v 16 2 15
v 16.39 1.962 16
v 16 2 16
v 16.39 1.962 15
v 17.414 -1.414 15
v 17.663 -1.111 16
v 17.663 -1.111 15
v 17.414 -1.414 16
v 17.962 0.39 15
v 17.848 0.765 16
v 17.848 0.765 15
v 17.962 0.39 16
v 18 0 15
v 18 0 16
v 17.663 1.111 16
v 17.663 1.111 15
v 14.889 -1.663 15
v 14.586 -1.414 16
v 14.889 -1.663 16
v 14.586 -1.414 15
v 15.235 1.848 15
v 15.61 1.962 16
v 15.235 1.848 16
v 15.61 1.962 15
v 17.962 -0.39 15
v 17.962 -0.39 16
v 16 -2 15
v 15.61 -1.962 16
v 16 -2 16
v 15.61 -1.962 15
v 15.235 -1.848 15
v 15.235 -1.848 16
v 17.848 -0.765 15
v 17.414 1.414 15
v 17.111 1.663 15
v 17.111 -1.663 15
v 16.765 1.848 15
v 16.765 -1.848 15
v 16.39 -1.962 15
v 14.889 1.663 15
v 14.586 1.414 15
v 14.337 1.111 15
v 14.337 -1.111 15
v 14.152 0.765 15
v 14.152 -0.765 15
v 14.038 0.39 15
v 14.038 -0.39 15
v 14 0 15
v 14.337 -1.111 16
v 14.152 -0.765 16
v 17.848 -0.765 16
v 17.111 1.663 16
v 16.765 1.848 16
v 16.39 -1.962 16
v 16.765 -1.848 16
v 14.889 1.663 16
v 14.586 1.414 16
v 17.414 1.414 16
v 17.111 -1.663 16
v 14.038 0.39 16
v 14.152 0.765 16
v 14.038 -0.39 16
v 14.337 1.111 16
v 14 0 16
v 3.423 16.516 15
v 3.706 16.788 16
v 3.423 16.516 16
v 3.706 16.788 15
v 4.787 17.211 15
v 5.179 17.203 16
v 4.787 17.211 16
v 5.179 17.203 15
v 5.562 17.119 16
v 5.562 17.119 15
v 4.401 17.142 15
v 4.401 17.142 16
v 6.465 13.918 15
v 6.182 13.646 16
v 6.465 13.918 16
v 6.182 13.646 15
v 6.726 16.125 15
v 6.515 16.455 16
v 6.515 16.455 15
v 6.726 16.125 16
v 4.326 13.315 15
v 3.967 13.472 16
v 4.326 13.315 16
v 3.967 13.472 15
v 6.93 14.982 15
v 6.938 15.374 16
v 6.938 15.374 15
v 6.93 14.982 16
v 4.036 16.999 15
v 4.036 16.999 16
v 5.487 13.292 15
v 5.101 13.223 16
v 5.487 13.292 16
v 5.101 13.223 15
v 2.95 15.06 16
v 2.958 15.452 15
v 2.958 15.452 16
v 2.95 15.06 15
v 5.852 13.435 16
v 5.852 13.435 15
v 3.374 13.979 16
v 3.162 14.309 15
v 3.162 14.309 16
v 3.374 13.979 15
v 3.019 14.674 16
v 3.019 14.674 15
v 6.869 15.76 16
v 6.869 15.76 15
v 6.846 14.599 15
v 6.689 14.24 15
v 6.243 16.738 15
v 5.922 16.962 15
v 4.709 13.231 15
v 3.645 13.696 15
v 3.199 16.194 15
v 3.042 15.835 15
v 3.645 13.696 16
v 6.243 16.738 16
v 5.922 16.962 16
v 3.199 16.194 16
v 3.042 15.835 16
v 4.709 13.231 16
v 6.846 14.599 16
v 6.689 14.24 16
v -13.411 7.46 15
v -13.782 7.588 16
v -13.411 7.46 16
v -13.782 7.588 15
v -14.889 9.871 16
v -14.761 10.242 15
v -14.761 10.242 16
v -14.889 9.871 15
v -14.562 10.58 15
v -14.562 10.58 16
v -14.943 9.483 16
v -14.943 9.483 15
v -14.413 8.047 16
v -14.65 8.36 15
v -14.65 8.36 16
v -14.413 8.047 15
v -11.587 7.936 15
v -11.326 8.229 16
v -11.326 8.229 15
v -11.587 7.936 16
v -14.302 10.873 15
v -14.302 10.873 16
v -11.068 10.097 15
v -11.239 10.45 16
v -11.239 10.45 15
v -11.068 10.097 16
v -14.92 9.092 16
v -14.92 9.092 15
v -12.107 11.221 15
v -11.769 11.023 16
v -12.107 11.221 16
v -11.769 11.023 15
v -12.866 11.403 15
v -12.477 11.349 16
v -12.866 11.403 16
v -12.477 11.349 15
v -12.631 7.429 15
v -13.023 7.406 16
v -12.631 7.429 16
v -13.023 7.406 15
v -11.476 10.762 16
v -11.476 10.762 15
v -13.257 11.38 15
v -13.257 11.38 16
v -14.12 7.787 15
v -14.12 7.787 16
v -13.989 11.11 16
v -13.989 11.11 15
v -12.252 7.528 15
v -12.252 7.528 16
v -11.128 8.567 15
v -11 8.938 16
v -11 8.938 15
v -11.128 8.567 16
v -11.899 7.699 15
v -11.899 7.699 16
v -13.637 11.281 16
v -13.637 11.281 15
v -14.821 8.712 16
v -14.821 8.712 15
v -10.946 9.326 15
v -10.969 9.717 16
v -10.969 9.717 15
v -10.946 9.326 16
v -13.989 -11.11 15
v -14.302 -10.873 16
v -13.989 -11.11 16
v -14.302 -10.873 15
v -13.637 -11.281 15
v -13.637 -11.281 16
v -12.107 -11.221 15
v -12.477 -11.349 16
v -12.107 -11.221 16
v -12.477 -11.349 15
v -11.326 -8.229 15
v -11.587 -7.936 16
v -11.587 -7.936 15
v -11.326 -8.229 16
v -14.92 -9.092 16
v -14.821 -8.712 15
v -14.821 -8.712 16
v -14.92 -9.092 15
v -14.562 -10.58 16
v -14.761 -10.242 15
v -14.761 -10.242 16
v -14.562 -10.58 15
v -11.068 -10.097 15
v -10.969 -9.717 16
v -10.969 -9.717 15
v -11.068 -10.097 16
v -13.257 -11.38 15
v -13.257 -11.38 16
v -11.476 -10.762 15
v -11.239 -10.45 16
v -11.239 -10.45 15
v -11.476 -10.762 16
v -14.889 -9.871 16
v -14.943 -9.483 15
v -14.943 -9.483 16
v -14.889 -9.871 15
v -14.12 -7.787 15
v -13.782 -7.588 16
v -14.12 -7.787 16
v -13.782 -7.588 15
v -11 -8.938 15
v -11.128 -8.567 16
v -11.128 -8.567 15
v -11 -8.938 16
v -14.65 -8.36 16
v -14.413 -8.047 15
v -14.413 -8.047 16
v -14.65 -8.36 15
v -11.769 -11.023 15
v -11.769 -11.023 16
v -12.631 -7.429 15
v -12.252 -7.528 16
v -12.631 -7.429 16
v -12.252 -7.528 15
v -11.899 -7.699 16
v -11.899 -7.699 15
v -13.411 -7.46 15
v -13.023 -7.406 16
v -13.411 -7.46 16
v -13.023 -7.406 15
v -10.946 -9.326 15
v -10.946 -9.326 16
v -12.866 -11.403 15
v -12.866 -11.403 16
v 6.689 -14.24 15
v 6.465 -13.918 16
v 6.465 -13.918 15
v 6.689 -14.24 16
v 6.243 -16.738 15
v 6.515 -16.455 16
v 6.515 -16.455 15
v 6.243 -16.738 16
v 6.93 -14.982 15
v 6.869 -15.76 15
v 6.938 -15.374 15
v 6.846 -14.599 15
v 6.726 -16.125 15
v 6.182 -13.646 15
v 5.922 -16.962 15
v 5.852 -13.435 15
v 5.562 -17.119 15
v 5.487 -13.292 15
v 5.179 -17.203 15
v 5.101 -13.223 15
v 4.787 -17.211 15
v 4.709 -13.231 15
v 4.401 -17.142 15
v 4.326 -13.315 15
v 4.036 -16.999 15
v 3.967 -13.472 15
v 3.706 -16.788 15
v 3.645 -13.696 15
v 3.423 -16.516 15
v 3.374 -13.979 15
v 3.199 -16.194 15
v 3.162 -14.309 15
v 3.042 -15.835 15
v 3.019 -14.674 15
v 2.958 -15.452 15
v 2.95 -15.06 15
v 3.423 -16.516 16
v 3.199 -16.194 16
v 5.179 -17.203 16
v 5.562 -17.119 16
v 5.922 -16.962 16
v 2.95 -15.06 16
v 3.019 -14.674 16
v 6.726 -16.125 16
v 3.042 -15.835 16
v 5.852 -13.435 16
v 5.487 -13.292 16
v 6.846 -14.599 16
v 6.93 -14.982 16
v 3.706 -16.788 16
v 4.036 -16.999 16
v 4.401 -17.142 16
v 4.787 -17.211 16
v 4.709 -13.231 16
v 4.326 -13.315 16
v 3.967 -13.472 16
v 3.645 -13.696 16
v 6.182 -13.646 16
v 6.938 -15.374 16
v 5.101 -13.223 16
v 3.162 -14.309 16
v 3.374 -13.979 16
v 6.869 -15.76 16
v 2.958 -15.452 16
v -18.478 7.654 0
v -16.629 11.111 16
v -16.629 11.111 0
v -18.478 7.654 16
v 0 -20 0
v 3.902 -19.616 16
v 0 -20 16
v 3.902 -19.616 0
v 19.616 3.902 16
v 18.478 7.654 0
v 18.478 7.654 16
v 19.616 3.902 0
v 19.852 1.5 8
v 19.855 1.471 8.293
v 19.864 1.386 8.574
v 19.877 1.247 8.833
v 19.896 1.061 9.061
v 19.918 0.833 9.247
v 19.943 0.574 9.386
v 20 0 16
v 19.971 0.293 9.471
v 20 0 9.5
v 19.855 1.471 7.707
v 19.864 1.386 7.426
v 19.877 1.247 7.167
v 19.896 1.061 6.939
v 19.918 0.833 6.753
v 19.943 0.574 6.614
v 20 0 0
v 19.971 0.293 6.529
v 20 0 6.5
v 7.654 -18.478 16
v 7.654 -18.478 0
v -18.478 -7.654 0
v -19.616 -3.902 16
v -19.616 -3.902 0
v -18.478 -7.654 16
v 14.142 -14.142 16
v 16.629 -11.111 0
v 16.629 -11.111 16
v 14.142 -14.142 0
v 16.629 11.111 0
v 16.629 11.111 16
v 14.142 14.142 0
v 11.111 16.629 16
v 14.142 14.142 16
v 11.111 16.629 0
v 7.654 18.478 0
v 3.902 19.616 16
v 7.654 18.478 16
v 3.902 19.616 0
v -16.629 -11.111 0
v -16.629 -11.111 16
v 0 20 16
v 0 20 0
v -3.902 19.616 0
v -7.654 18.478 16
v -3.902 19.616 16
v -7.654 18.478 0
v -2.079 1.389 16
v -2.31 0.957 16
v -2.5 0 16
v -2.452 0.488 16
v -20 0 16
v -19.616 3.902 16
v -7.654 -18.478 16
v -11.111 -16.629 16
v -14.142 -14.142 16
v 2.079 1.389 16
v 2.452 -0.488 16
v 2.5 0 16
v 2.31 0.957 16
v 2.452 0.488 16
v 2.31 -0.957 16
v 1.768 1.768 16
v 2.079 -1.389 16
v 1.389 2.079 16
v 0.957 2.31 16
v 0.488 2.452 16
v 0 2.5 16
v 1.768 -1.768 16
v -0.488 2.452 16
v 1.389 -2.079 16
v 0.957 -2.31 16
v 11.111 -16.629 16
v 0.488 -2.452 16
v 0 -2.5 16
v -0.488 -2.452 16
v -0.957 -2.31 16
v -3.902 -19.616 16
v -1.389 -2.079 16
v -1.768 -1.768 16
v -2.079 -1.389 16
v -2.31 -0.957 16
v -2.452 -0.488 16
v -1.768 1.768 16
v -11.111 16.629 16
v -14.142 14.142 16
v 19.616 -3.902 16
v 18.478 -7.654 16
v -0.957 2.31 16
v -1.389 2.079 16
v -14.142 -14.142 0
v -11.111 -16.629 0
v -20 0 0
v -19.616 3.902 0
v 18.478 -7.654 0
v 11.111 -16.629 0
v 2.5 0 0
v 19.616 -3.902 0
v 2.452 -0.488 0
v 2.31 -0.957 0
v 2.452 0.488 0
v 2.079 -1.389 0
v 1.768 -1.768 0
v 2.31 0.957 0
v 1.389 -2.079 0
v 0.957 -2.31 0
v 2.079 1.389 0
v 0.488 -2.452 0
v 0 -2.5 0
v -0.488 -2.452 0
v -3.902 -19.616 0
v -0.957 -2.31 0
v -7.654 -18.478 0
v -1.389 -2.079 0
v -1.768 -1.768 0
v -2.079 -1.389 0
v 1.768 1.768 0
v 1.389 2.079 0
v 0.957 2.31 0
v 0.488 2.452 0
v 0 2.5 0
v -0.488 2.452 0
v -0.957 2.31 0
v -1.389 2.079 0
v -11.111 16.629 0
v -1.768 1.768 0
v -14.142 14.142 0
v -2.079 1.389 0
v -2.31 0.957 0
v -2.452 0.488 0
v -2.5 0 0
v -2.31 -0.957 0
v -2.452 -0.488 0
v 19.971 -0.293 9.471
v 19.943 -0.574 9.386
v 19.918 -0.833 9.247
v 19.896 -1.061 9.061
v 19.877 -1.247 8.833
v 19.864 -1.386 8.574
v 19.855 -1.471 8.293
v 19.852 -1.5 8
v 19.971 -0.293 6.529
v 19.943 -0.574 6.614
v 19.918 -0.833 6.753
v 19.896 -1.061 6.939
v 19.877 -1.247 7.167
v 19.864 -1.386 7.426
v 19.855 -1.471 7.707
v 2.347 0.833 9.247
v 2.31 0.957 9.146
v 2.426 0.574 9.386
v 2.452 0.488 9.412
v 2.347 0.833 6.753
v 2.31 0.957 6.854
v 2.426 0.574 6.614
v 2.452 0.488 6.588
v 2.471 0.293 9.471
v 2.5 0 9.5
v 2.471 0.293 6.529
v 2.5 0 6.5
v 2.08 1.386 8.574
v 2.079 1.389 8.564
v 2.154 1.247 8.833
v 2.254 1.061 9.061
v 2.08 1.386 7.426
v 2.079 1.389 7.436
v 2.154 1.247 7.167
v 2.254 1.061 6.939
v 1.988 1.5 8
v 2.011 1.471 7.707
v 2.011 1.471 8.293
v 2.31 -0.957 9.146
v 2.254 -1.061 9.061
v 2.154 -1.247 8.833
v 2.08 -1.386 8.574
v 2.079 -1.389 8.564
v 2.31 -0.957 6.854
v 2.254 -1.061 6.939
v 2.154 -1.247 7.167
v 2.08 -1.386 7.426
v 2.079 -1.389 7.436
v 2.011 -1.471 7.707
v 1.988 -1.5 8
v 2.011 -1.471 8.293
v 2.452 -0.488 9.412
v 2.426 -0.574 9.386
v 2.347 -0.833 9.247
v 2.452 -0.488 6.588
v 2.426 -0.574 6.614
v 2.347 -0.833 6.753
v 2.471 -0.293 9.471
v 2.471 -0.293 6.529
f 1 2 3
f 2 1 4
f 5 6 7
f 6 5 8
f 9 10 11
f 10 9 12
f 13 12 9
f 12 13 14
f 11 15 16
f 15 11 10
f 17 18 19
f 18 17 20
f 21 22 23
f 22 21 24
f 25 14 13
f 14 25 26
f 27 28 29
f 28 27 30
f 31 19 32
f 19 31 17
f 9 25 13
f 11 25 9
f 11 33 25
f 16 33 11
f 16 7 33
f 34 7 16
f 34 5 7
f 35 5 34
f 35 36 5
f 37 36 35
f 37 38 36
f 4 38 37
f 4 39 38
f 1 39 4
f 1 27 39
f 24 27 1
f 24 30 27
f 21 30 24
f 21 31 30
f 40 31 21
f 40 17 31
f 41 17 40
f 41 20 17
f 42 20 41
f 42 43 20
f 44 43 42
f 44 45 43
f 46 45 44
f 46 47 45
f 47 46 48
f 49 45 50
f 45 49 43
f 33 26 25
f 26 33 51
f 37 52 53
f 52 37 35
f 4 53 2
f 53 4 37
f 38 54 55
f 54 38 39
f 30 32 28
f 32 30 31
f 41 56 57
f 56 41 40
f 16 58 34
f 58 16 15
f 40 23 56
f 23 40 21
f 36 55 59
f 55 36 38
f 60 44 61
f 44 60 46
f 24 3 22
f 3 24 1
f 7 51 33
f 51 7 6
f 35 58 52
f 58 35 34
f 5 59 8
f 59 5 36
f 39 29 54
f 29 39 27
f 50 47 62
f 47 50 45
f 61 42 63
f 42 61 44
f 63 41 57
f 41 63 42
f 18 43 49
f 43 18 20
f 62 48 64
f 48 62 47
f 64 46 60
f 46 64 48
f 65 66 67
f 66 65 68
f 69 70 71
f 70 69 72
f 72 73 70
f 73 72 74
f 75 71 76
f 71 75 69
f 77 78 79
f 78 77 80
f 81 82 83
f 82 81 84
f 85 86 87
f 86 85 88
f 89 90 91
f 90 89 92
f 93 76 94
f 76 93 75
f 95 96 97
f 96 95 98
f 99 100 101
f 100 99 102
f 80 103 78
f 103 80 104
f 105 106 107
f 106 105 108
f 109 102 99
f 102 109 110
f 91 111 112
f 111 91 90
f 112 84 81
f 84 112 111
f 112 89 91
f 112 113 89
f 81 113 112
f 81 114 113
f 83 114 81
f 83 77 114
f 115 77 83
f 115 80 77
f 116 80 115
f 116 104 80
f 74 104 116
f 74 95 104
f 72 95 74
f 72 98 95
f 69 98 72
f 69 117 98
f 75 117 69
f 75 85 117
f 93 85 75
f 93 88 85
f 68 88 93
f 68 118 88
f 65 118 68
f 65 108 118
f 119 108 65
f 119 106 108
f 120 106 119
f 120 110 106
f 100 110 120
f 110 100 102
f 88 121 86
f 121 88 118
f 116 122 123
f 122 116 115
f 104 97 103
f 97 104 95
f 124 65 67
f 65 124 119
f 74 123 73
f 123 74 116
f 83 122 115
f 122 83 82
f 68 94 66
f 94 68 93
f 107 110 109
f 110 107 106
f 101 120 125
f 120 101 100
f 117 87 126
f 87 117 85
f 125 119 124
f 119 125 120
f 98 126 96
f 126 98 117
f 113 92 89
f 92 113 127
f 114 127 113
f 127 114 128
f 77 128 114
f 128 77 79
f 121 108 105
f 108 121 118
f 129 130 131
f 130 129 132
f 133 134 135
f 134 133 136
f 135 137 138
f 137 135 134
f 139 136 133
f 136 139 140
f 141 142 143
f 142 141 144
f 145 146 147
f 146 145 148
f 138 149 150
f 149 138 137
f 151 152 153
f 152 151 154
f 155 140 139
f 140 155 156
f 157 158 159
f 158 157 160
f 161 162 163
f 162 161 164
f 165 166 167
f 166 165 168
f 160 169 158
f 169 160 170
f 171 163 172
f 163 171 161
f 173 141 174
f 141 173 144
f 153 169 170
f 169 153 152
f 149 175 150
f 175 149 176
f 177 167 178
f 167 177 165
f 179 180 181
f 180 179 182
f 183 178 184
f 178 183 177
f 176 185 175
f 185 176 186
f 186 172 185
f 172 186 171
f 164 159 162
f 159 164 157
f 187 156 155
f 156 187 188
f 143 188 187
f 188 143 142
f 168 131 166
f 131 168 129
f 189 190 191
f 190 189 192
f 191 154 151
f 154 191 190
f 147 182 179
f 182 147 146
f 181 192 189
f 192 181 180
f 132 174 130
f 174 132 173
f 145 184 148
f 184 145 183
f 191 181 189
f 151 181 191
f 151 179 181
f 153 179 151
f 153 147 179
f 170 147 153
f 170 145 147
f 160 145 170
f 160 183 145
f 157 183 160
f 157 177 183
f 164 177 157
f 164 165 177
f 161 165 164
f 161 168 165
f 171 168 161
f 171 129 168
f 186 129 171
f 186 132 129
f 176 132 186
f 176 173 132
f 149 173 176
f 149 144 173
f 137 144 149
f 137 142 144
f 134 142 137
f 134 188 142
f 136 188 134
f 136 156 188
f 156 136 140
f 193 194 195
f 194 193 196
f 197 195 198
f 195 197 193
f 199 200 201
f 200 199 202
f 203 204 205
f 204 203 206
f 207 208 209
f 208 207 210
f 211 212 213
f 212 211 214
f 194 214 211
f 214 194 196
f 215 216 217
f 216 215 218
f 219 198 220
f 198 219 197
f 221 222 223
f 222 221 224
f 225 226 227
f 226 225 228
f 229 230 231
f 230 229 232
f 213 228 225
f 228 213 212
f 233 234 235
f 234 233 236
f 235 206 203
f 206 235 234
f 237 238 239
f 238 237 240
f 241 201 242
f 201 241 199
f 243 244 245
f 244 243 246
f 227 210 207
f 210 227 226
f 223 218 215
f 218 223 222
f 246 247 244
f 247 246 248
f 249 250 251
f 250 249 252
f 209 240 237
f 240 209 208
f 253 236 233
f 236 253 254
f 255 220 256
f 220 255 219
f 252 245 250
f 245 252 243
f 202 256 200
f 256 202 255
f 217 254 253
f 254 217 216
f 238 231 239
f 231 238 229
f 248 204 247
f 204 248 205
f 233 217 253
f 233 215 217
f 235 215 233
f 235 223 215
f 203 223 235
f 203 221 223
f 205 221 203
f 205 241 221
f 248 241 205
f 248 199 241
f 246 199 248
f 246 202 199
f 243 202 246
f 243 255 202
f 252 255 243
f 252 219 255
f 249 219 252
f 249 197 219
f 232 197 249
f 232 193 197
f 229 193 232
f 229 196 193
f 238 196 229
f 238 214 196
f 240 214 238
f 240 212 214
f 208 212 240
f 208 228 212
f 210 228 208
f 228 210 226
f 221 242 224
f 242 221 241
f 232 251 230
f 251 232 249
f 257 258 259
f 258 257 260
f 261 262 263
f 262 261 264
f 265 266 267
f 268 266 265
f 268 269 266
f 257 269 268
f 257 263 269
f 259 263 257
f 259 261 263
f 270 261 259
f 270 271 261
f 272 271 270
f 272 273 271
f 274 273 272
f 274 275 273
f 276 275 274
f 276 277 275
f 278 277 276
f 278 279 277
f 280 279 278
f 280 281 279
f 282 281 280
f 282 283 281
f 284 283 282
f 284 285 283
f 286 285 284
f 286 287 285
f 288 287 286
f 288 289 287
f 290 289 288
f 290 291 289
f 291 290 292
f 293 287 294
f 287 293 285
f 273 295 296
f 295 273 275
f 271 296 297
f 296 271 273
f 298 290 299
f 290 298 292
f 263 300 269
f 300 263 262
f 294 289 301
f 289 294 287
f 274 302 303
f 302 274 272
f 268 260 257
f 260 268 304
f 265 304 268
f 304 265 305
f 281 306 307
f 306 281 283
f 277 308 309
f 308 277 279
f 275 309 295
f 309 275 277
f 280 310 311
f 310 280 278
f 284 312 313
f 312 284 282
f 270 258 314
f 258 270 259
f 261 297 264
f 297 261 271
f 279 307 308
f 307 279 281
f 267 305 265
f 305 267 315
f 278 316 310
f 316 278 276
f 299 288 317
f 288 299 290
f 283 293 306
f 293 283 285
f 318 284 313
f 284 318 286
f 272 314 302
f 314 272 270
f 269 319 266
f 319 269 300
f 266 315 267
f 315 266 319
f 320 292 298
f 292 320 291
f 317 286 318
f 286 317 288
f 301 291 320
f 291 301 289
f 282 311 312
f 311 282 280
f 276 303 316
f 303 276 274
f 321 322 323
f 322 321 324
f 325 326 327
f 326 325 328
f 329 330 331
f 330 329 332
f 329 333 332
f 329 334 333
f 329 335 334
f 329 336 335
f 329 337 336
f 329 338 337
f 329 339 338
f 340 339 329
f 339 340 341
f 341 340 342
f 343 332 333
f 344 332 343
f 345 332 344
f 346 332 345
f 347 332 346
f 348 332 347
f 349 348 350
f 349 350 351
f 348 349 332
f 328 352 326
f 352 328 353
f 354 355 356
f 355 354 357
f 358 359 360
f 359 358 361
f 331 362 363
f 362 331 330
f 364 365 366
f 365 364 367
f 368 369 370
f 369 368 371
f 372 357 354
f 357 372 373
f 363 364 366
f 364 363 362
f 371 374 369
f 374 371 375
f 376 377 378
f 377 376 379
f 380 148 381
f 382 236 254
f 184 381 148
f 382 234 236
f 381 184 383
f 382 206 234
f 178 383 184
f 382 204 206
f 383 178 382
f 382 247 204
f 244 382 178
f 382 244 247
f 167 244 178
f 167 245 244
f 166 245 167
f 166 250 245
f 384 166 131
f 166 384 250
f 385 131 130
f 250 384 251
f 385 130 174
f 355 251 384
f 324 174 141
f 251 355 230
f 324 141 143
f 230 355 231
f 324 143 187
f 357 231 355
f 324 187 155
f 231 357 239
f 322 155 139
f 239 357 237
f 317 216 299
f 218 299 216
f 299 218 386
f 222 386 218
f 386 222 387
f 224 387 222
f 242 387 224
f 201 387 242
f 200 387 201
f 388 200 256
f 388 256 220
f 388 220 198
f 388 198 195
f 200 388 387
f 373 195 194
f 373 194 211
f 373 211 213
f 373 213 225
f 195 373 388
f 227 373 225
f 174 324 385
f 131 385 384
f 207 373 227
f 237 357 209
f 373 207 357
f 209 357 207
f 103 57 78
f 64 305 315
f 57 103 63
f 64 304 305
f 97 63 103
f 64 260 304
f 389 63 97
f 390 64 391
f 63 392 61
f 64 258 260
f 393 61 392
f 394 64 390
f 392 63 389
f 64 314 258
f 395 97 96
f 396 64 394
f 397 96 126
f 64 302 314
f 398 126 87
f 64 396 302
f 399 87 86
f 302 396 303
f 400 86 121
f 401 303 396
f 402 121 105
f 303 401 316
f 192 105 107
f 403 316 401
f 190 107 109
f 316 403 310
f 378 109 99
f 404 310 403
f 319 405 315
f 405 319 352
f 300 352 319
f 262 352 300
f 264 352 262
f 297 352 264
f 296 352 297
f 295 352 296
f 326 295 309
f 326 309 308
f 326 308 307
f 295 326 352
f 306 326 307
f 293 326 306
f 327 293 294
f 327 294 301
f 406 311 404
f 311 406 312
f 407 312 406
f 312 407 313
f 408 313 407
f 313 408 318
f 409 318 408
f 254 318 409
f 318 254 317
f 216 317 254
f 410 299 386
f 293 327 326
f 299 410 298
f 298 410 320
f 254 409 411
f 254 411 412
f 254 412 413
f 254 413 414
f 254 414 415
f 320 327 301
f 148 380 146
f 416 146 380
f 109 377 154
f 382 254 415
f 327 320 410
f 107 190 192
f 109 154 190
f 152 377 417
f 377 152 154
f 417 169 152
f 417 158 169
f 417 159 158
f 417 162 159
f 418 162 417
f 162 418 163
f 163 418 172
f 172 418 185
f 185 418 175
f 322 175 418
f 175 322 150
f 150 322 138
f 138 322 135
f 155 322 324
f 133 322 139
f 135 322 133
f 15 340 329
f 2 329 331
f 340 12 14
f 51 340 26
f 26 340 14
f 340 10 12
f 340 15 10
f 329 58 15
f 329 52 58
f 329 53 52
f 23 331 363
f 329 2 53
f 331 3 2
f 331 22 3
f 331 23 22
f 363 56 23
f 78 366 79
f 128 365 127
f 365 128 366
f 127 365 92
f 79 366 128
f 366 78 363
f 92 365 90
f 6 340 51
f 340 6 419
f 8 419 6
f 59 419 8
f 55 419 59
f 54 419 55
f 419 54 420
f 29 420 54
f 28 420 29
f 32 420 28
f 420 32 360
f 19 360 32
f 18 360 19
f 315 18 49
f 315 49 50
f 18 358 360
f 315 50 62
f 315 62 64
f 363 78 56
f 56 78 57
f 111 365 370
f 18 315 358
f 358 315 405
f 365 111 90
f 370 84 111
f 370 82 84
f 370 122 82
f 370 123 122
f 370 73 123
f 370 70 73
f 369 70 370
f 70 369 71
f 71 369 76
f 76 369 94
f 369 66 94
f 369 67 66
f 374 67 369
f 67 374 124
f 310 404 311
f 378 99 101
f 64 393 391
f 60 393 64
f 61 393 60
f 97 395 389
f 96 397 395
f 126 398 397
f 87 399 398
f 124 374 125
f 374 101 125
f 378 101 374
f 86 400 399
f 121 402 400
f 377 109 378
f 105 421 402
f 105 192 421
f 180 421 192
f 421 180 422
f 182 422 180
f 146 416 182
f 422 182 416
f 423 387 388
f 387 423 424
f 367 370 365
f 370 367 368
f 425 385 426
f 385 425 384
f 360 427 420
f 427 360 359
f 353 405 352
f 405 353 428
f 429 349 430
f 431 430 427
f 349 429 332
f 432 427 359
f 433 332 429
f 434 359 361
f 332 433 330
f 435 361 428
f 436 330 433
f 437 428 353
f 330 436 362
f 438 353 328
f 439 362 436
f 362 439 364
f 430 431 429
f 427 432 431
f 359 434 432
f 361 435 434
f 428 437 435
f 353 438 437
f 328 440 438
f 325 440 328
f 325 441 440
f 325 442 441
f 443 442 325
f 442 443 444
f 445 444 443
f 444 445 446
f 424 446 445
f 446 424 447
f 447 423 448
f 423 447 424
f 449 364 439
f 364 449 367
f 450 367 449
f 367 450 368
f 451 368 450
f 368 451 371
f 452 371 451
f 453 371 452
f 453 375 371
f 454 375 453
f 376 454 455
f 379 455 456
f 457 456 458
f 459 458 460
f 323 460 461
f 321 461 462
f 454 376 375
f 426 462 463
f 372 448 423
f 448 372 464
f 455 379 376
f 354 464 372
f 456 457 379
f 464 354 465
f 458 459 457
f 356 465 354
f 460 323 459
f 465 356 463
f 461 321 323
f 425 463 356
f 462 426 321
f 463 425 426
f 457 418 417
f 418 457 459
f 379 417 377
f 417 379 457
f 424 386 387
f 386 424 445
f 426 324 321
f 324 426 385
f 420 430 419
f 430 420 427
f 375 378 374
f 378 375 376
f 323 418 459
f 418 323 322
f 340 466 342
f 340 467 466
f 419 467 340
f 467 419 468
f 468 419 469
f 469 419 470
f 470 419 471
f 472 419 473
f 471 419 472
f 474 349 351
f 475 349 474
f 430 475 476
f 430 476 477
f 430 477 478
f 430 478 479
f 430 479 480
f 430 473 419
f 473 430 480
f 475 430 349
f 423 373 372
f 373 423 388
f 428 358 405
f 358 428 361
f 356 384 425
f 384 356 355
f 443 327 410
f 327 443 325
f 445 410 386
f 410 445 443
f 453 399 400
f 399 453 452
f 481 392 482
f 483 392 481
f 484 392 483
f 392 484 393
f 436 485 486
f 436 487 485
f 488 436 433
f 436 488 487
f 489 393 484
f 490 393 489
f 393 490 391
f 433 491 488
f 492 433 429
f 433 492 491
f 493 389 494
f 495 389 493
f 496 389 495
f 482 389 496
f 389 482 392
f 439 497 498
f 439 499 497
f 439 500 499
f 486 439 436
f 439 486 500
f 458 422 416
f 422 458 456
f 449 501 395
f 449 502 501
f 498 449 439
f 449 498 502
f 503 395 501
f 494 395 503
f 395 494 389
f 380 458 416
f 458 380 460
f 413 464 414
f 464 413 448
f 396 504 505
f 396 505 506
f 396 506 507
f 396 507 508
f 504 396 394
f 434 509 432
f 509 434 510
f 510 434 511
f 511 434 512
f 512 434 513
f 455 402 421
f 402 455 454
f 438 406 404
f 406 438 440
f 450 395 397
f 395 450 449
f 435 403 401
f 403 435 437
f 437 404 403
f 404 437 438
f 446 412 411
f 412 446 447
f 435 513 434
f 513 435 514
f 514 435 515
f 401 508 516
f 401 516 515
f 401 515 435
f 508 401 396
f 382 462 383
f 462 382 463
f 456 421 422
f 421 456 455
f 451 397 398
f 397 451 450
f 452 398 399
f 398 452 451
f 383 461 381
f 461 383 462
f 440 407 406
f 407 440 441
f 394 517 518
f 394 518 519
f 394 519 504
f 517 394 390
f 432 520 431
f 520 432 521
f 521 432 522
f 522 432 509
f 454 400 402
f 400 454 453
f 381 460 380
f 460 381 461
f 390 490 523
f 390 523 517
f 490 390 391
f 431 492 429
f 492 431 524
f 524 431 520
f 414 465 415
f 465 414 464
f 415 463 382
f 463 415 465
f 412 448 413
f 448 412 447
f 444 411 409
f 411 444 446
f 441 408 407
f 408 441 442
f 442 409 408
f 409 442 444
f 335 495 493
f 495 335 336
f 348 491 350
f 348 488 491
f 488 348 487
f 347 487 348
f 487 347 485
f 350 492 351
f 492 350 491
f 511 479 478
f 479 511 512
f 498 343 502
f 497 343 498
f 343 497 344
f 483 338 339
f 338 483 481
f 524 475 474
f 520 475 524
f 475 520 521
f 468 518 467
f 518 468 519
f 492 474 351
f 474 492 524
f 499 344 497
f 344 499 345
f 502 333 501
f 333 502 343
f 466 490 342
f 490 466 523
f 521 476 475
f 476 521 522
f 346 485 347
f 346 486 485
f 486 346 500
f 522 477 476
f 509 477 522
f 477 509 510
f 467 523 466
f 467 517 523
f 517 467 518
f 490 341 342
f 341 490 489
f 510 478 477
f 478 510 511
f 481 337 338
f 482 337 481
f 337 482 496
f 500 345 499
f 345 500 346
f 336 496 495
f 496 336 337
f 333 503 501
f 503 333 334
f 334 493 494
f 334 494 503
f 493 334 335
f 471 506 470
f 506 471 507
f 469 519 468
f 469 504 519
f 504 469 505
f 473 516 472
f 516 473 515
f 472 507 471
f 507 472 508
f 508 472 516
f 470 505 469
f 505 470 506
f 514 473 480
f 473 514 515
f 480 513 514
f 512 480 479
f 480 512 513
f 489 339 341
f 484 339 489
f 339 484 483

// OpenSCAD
$fn = 32;

// ----------------------------------------------------------------------
// Control knob: dimpled knob
// ----------------------------------------------------------------------

// --- parameters (mm) ---
dimp_d = 4;               // finger dimple diameter
n_dimp = 5;               // number of dimples
dimp_r = 16;              // dimple ring radius
knob_d = 40;              // knob body diameter
knob_h = 16;              // knob body height
bore_d = 5;               // shaft bore diameter
set_d = 3;                // set screw bore diameter

dimp_step = 360 / n_dimp;  // dimple angular step

difference() {
  cylinder(h = knob_h, d = knob_d);
  translate([0, 0, -1]) cylinder(h = knob_h + 2, d = bore_d);
  translate([-1, 0, knob_h / 2]) rotate([0, 90, 0])
    cylinder(h = knob_d / 2 + bore_d / 2 + 2, d = set_d);  for (i = [0 : n_dimp - 1])
    rotate([0, 0, i * dimp_step])
      translate([dimp_r, 0, knob_h - 1])
        cylinder(h = 2, d = dimp_d);
}
